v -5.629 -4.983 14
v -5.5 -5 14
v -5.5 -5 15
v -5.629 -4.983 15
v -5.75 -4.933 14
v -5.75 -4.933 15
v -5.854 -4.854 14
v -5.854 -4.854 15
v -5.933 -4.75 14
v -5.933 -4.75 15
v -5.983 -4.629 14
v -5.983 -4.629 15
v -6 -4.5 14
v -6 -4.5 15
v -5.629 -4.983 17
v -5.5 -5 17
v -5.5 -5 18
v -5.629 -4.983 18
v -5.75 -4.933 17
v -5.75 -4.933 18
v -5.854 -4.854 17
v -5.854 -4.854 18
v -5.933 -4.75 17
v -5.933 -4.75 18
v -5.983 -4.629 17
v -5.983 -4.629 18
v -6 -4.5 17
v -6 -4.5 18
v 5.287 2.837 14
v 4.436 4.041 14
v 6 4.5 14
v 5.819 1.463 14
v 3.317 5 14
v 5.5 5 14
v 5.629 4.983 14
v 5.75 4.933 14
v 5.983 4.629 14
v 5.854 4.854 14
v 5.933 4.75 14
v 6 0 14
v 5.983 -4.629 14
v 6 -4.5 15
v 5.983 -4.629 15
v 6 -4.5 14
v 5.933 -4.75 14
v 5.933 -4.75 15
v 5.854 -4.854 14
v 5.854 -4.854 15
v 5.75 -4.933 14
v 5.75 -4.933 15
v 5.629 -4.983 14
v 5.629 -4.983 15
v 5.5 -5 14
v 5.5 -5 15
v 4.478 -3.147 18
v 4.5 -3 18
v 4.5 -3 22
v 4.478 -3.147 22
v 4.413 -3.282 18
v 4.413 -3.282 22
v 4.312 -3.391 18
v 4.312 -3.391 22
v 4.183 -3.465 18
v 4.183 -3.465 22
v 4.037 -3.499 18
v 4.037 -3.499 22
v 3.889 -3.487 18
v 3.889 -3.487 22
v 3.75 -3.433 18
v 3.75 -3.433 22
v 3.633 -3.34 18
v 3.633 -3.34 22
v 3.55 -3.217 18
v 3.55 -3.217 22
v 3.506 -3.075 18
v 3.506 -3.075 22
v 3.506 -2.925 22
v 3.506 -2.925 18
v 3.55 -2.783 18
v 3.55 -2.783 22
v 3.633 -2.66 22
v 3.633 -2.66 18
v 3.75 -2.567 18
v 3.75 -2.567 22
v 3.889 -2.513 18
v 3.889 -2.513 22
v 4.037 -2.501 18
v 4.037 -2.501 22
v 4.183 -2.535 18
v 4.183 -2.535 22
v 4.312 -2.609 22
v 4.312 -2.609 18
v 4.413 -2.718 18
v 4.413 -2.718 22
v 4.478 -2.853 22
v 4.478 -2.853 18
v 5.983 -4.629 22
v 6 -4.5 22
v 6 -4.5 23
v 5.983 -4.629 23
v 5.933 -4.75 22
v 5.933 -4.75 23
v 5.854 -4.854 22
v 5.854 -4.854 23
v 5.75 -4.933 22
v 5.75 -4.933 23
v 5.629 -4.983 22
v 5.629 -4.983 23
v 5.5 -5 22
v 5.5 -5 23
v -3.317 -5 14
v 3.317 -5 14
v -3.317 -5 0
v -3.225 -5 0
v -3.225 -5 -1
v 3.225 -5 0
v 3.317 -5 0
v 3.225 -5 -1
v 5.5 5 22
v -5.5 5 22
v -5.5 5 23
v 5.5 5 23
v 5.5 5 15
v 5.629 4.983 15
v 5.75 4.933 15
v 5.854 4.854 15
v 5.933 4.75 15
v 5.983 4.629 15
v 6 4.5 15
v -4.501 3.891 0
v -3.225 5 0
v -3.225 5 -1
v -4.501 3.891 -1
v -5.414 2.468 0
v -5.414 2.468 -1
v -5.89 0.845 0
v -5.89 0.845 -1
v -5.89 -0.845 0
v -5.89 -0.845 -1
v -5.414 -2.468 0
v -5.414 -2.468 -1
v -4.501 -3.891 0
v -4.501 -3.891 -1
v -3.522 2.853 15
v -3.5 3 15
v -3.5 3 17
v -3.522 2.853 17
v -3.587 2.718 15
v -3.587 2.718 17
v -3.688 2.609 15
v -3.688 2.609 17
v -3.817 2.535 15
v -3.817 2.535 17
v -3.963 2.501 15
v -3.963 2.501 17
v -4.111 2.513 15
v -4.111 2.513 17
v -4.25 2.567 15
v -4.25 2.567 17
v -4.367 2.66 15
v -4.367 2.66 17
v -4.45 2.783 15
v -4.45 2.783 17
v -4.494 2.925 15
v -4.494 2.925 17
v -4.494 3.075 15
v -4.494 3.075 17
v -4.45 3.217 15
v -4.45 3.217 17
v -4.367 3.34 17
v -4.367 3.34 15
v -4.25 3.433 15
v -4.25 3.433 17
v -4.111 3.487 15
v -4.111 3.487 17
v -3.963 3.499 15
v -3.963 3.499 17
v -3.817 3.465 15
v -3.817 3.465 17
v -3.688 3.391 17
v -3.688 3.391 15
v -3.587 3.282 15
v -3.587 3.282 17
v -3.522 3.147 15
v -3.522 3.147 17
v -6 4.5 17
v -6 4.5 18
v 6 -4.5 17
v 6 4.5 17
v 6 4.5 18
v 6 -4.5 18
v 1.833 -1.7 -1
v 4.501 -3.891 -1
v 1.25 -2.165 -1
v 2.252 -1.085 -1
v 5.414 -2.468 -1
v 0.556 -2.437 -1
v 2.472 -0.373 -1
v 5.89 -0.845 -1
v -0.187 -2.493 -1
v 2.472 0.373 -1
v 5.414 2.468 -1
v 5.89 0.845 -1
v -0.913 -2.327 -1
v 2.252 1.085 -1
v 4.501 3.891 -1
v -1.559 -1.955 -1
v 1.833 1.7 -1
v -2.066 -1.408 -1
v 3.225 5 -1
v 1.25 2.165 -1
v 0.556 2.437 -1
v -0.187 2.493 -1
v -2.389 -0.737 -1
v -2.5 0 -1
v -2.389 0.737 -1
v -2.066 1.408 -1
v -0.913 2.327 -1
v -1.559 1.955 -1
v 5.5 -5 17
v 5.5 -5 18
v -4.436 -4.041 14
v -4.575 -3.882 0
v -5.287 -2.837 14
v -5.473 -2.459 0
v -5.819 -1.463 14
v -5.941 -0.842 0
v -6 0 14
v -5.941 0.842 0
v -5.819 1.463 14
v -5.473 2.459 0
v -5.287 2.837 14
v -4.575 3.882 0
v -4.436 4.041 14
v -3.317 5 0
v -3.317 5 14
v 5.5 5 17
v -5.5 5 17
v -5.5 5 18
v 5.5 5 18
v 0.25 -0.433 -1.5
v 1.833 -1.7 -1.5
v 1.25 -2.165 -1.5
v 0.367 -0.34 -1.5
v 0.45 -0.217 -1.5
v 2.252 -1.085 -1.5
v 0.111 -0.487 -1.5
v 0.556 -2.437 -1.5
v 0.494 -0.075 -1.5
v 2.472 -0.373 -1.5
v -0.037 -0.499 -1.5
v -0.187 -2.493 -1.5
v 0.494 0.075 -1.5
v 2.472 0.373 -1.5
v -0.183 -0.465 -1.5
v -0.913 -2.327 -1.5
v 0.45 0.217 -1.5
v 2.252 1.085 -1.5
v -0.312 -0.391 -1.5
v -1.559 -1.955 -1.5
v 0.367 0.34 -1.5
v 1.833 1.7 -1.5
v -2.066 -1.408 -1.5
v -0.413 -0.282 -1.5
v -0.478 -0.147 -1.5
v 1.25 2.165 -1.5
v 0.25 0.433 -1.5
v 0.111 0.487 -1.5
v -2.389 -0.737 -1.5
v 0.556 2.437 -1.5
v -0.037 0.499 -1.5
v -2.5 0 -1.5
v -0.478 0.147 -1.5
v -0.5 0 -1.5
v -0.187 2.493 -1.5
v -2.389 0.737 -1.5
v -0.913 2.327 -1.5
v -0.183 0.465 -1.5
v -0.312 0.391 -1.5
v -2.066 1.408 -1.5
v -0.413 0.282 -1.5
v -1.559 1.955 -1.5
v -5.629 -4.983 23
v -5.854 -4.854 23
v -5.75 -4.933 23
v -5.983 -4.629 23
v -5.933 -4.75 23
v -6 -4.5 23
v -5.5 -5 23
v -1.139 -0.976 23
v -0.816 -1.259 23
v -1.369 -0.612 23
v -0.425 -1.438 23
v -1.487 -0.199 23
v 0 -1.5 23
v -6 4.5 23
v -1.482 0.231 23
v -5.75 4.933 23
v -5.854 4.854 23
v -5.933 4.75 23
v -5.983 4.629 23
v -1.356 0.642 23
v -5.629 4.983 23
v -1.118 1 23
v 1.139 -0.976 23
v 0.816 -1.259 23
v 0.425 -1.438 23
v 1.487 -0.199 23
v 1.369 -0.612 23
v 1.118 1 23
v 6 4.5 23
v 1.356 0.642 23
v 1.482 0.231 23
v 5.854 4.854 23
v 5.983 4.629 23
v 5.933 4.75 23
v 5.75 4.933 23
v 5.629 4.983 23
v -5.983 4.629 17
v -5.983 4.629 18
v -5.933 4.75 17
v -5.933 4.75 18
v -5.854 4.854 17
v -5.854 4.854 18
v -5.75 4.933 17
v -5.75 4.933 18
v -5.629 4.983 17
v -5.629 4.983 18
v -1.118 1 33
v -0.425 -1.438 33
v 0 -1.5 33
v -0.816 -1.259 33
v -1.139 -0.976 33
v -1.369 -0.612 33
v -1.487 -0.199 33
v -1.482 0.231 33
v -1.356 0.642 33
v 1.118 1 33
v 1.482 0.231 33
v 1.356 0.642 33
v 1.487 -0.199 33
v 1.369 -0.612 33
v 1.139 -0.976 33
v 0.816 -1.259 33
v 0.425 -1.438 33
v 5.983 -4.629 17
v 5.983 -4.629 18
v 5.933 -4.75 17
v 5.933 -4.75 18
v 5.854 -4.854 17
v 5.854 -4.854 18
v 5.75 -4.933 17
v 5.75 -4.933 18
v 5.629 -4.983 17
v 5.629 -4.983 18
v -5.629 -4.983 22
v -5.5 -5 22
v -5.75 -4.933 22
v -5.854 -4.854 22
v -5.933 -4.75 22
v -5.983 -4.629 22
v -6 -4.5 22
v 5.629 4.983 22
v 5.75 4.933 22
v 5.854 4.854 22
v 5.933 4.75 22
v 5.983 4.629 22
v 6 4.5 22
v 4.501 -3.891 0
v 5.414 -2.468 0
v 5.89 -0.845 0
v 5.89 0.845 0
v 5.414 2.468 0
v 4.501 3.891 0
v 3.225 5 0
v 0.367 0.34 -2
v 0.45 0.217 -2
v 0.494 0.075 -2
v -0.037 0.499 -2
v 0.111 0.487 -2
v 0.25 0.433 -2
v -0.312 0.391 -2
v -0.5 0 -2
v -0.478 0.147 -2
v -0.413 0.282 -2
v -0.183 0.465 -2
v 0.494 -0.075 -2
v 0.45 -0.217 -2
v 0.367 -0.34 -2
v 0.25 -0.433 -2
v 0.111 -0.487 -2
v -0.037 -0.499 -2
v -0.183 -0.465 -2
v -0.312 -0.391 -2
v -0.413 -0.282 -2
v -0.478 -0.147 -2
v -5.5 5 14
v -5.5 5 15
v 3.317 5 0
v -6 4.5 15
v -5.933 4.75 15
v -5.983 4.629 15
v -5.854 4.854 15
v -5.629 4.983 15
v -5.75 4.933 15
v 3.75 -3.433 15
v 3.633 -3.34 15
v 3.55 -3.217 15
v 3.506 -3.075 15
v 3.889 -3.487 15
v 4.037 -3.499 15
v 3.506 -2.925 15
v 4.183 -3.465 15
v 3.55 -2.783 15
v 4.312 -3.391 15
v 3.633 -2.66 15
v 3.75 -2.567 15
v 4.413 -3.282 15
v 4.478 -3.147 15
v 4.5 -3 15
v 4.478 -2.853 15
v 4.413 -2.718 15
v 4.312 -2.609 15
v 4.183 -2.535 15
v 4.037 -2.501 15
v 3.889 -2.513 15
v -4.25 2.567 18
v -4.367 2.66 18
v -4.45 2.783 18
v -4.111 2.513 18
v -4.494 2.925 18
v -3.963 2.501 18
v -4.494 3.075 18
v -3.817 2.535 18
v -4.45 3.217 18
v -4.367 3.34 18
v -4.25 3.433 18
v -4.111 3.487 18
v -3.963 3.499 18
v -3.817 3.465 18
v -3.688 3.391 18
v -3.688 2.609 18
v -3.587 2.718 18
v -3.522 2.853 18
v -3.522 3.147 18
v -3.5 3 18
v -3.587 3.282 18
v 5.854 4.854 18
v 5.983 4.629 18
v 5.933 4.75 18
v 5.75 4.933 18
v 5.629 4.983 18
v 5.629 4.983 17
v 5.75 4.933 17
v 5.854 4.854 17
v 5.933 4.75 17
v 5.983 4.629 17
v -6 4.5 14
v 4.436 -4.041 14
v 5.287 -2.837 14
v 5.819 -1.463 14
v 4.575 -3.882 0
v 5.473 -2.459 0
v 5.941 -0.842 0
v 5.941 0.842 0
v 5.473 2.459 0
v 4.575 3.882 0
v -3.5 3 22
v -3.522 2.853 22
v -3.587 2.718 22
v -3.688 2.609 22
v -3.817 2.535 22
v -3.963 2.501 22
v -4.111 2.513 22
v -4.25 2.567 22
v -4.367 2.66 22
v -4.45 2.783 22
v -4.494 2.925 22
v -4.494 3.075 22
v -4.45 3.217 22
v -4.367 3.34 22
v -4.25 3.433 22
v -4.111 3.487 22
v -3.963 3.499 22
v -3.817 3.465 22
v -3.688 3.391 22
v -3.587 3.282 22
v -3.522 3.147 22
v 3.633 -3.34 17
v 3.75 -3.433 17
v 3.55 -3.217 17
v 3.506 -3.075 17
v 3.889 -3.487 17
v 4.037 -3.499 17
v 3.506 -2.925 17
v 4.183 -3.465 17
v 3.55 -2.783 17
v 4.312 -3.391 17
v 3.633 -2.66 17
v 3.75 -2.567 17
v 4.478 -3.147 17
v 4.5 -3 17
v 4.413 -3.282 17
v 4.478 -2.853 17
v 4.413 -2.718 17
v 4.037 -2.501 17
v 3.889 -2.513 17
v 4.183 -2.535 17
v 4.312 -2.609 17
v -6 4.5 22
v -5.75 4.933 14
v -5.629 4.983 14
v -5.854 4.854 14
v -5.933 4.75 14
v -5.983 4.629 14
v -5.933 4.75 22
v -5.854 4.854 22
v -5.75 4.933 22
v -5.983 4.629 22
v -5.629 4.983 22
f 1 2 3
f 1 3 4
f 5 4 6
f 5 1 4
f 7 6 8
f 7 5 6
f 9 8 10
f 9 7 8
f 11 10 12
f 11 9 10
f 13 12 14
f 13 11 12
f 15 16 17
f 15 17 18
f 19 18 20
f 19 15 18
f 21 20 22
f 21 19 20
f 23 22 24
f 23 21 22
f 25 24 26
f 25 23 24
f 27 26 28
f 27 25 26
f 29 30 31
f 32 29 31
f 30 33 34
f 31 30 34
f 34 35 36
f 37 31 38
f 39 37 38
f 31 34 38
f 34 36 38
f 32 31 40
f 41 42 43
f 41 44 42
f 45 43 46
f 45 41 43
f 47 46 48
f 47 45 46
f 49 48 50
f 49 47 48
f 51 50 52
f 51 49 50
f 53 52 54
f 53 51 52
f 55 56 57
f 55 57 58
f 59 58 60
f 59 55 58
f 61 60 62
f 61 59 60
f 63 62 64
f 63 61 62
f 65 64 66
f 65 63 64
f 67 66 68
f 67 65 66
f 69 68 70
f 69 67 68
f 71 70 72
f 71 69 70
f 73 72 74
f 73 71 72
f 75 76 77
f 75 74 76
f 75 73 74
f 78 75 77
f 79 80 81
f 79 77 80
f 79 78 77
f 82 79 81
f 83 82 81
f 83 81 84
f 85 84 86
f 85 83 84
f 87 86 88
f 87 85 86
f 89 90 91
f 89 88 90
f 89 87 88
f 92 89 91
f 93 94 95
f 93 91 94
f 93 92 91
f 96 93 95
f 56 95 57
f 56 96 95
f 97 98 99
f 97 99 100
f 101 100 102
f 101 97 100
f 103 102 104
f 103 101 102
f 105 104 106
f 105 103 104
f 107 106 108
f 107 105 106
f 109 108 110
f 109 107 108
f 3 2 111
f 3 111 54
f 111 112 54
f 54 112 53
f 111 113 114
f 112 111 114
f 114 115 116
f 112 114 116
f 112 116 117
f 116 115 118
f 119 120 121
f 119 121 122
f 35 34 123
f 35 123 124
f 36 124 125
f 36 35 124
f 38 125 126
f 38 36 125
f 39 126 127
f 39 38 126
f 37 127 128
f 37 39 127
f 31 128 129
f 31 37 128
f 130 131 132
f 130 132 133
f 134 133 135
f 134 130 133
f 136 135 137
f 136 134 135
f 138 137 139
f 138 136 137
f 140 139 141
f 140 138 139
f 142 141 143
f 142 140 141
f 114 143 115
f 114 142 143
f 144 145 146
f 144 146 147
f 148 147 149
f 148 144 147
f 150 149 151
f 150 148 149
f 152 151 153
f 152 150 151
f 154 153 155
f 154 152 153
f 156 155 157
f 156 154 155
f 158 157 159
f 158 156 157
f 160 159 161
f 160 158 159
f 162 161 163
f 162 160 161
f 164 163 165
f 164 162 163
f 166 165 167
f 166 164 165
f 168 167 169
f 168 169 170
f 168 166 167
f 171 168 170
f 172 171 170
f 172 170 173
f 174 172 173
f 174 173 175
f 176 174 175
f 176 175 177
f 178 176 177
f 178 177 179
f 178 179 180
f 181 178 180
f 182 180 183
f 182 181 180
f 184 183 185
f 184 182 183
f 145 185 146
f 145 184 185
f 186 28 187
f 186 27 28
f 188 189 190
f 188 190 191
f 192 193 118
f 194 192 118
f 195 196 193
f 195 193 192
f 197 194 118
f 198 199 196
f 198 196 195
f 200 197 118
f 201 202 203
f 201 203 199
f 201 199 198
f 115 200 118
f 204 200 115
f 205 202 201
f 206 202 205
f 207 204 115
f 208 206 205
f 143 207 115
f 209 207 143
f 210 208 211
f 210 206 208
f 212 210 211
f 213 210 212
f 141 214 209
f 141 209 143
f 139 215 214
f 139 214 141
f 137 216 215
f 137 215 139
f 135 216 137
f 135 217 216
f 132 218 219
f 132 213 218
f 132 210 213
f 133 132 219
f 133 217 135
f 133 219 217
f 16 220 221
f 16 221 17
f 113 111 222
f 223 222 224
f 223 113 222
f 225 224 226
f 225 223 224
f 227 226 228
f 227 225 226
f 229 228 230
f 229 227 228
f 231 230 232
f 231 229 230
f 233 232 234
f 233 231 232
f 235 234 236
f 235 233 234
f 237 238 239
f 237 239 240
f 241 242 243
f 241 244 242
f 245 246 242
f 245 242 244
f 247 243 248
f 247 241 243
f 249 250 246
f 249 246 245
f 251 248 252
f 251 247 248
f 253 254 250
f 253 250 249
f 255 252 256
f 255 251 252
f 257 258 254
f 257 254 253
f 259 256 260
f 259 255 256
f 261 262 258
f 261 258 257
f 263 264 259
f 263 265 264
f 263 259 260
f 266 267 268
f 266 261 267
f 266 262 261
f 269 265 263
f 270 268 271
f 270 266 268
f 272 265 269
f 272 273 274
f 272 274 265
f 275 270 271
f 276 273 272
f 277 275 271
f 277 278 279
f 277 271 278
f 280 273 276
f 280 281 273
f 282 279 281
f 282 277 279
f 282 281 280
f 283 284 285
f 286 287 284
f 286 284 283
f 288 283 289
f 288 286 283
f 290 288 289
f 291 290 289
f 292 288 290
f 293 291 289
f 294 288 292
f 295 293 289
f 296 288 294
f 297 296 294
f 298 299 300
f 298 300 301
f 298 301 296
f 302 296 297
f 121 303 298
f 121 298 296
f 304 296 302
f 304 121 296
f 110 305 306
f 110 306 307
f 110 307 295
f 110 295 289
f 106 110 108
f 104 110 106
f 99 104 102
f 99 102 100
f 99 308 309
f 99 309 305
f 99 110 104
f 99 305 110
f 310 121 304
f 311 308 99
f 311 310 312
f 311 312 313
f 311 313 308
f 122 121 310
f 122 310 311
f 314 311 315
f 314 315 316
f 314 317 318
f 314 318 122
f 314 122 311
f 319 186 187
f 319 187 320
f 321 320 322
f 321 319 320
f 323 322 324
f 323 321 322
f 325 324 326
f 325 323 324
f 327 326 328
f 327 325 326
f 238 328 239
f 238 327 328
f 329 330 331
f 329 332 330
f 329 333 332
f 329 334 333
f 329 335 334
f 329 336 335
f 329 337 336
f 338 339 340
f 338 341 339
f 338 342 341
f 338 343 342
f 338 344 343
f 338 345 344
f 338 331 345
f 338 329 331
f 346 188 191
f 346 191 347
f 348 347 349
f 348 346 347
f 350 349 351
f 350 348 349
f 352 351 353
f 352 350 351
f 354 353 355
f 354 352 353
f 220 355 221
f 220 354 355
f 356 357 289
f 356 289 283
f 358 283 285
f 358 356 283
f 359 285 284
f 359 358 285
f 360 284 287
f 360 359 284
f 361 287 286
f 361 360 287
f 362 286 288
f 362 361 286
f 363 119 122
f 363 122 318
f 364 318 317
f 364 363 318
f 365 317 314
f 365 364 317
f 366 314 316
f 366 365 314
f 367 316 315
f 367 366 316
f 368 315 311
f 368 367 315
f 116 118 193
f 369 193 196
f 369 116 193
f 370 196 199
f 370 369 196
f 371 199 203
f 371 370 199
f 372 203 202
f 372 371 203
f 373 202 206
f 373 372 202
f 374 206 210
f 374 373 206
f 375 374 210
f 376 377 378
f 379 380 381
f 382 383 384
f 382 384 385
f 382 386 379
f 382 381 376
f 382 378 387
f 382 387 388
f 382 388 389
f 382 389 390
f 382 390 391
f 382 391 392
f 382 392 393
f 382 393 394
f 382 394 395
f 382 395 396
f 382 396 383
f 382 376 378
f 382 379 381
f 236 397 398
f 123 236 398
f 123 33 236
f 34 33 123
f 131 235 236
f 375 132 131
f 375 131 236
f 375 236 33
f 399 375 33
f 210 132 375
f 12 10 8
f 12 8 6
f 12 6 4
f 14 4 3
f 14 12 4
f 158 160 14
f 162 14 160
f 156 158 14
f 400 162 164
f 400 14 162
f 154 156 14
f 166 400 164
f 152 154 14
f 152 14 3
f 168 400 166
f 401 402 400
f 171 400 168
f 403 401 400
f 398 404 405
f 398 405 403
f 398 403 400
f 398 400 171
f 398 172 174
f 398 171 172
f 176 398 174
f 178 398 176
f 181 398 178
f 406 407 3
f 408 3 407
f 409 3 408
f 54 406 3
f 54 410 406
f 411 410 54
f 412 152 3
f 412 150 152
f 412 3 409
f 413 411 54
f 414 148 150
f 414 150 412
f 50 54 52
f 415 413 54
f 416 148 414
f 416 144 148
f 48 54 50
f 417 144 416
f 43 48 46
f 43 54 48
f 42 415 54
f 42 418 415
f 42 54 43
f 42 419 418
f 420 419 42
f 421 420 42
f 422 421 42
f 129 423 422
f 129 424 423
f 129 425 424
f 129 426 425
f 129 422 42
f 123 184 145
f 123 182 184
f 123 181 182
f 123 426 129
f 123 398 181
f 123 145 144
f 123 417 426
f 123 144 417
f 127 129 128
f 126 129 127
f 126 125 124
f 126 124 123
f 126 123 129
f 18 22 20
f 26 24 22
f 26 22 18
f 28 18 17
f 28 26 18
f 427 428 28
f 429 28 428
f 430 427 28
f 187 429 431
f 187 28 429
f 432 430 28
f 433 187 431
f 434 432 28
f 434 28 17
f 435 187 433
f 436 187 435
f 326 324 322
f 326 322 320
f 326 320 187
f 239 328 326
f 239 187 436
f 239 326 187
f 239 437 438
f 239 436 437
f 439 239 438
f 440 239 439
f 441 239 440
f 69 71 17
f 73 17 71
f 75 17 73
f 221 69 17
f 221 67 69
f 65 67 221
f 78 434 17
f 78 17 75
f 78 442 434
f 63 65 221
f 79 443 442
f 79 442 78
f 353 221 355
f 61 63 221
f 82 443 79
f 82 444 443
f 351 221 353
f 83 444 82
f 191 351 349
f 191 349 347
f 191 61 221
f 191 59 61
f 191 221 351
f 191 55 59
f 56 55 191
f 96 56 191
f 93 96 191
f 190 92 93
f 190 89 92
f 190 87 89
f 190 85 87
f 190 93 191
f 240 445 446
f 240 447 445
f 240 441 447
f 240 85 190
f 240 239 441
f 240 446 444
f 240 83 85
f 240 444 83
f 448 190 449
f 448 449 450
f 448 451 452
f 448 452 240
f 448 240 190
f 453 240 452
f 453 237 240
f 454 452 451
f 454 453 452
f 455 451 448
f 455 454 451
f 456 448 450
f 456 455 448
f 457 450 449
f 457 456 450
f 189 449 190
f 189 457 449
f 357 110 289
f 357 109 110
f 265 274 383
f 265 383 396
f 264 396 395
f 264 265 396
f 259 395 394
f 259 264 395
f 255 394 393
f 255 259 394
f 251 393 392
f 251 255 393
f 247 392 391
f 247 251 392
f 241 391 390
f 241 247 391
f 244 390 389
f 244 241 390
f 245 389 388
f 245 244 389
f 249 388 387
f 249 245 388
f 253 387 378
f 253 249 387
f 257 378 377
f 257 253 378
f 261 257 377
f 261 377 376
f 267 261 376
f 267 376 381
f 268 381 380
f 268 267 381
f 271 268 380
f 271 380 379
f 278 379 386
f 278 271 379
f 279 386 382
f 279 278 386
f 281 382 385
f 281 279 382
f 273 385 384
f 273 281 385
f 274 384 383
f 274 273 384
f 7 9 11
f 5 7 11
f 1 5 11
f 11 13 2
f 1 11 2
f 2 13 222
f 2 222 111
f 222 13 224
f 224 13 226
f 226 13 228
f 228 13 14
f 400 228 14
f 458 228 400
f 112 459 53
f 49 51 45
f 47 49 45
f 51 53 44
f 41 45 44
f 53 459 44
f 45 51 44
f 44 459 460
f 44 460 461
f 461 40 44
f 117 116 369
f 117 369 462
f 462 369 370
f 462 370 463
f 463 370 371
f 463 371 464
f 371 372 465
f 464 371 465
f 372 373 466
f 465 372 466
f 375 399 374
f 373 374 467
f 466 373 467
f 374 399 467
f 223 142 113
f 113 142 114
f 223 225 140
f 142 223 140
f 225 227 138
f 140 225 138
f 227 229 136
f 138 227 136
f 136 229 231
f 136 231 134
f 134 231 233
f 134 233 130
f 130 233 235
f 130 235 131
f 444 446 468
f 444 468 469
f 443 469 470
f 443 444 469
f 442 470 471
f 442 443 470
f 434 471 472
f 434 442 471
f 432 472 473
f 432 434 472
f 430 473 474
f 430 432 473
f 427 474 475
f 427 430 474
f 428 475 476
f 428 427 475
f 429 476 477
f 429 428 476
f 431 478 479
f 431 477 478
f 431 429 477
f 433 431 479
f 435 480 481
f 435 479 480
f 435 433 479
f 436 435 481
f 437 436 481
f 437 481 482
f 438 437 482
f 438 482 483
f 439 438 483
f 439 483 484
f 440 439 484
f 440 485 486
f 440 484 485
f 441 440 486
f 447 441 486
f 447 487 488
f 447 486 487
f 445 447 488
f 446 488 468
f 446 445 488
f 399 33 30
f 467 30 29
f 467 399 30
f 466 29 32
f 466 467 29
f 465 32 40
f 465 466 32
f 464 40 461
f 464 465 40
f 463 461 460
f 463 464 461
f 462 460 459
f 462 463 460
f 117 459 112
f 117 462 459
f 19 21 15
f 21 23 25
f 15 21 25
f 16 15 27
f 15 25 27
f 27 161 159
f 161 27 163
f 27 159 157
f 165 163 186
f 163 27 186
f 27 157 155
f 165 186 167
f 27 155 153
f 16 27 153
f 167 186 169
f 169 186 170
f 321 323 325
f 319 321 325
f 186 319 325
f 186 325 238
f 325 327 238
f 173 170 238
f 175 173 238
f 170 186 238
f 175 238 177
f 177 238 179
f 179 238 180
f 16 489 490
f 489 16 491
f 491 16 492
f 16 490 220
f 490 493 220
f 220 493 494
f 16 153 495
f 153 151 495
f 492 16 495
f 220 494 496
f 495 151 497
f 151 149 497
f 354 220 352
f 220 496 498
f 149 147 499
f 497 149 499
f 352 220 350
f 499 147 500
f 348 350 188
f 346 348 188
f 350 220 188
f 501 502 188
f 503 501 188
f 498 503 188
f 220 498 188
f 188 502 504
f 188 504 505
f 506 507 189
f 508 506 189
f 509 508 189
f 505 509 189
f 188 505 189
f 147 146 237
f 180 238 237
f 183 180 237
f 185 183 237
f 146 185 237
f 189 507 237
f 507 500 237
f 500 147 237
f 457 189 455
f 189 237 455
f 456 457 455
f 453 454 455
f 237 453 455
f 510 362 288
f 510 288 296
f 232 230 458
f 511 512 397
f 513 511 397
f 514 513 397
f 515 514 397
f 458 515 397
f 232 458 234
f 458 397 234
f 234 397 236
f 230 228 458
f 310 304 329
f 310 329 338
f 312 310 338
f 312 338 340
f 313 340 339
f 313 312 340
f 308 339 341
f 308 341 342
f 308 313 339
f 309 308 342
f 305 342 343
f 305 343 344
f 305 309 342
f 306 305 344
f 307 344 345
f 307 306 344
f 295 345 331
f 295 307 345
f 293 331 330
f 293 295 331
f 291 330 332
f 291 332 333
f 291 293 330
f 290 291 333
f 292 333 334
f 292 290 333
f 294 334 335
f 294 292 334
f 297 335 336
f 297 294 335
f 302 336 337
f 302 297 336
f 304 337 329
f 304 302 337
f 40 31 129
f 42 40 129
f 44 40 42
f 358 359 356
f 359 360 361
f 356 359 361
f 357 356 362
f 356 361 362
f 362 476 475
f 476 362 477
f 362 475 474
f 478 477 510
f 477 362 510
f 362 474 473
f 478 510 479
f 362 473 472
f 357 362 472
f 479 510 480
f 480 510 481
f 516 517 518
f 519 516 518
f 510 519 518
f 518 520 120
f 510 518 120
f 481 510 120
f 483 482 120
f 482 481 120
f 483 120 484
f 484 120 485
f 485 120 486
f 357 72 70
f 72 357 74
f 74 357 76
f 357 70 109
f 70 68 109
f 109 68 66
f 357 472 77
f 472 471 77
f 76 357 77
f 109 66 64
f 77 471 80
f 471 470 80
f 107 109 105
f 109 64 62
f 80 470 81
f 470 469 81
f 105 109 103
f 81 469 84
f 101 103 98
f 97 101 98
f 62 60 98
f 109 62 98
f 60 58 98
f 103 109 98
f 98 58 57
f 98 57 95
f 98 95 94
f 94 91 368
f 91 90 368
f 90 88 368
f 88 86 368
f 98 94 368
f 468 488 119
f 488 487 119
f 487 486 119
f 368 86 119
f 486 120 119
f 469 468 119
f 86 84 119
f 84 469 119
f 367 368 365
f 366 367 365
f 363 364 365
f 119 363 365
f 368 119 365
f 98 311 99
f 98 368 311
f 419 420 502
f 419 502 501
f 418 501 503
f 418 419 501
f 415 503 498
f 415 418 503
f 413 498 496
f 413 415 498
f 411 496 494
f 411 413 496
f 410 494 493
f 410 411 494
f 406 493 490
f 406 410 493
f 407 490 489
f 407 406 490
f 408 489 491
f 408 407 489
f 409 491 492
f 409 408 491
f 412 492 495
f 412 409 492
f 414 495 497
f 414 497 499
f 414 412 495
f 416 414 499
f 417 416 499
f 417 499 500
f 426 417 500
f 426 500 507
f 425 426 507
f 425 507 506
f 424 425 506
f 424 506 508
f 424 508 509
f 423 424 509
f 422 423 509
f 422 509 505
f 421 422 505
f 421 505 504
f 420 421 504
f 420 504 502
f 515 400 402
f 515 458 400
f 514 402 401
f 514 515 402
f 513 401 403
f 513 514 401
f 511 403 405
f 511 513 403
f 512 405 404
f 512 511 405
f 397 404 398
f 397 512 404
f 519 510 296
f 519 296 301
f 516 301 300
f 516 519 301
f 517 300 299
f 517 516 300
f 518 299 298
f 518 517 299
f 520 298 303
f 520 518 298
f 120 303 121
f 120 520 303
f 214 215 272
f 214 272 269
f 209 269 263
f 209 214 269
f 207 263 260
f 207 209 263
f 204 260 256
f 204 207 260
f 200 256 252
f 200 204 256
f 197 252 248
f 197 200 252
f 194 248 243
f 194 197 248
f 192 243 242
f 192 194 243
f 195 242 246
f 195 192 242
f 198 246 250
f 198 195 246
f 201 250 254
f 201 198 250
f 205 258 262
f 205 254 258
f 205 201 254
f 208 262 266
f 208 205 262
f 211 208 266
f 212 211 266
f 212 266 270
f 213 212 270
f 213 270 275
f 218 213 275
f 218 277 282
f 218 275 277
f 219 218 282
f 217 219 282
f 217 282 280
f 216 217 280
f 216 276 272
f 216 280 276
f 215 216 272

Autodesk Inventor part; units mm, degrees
ref_plane "YZ Plane" through (0, 0, 0) normal (1, 0, 0) x (0, 1, 0)
ref_plane "XZ Plane" through (0, 0, 0) normal (0, 1, 0) x (-1, 0, 0)
ref_plane "XY Plane" through (0, 0, 0) normal (0, 0, 1) x (1, 0, 0)
sketch "Sketch1" plane through (0, 0, 0) normal (0, 0, 1) x (1, 0, 0)
  circle A0 centre (0, 0) radius 6
  line L0 (0, 0) -> (0, 5)
  line L1 (0, 5) -> (3.3166, 5)
  line L2 (0, 5) -> (-3.3166, 5)
  line L3 (0, 0) -> (0, -5)
  line L4 (0, -5) -> (3.3166, -5)
  line L5 (0, -5) -> (-3.3166, -5)
  dimension "d0" = 12
  dimension "d1" = 5
  dimension "d2" = 5
extrude "Extrusion1" add sketch "Sketch1" along normal blind 14 contours A0 L4 L3 L0 L1 | L2 L0 L3 L5 A0
sketch "Sketch2" plane through (0, 0, 14) normal (0, 0, 1) x (1, 0, 0)
  arc A0 (-3.3166, 5) -> (-3.3166, -5) centre (0, 0) ccw projected
  line L0 (-6, 0) -> (-6, 4.5)
  line L1 (-5.5, 5) -> (5.5, 5)
  line L2 (6, 4.5) -> (6, -4.5)
  line L3 (5.5, -5) -> (-5.5, -5)
  line L4 (-6, -4.5) -> (-6, 5)
  arc A1 (-5.5, 5) -> (-6, 4.5) centre (-5.5, 4.5) ccw
  arc A2 (-6, -4.5) -> (-5.5, -5) centre (-5.5, -4.5) ccw
  arc A3 (5.5, -5) -> (6, -4.5) centre (5.5, -4.5) ccw
  arc A4 (6, 4.5) -> (5.5, 5) centre (5.5, 4.5) ccw
  point P0 (6, -5)
  point P1 (-6, -5)
  dimension "d5" = 12
  dimension "d6" = 0.5
  dimension "d32" = 10
  dimension "d33" = 5
extrude "Extrusion2" add sketch "Sketch2" along normal blind 1
sketch "Sketch3" plane through (0, 0, 15) normal (0, 0, 1) x (1, 0, 0)
  line L0 (0, 0) -> (-4, 0)
  line L1 (-4, 0) -> (-4, 3)
  line L2 (0, 0) -> (0, -3)
  line L3 (0, -3) -> (4, -3)
  circle A0 centre (-4, 3) radius 0.5
  circle A1 centre (4, -3) radius 0.5
  dimension "d9" = 4
  dimension "d10" = 3
  dimension "d11" = 3
  dimension "d12" = 4
  dimension "d13" = 1
  dimension "d14" = 1
extrude "Extrusion3" add sketch "Sketch3" along normal blind 2
sketch "Sketch4" plane through (-4, 3, 17) normal (0, 0, 1) x (1, 0, 0)
  line L0 (-1.5, 2) -> (9.5, 2)
  line L1 (10, 1.5) -> (10, -7.5)
  line L2 (9.5, -8) -> (-1.5, -8)
  line L3 (-2, -7.5) -> (-2, 1.5)
  arc A0 (-1.5, 2) -> (-2, 1.5) centre (-1.5, 1.5) ccw
  arc A1 (-2, -7.5) -> (-1.5, -8) centre (-1.5, -7.5) ccw
  arc A2 (9.5, -8) -> (10, -7.5) centre (9.5, -7.5) ccw
  arc A3 (10, 1.5) -> (9.5, 2) centre (9.5, 1.5) ccw
  line L4 (-1.5, -8) -> (9.5, -8) projected
  line L5 (-2, 1.5) -> (-2, -7.5) projected
  point P0 (4, -3)
  dimension "d17" = 0.5
  dimension "d36" = 10
  dimension "d37" = 12
  dimension "d38" = 0
  dimension "d39" = 0
extrude "Extrusion4" add sketch "Sketch4" along normal blind 1
sketch "Sketch5" plane through (-4, 3, 18) normal (0, 0, 1) x (1, 0, 0)
  circle A0 centre (0, 0) radius 0.5 projected
  circle A1 centre (0, 0) radius 0.5
  circle A2 centre (8, -6) radius 0.5 projected
  circle A3 centre (8, -6) radius 0.5
  point P0 (4, -3)
  point P1 (7.9, -5.5101)
  point P2 (7.9, -6.4899)
extrude "Extrusion5" add sketch "Sketch5" along normal blind 4
sketch "Sketch6" plane through (-4, 3, 22) normal (0, 0, 1) x (1, 0, 0)
  line L0 (-1.5, 2) -> (9.5, 2)
  line L1 (10, 1.5) -> (10, -7.5)
  line L2 (9.5, -8) -> (-1.5, -8)
  line L3 (-2, -7.5) -> (-2, 1.5)
  arc A0 (-1.5, 2) -> (-2, 1.5) centre (-1.5, 1.5) ccw
  arc A1 (10, 1.5) -> (9.5, 2) centre (9.5, 1.5) ccw
  arc A2 (9.5, -8) -> (10, -7.5) centre (9.5, -7.5) ccw
  arc A3 (-2, -7.5) -> (-1.5, -8) centre (-1.5, -7.5) ccw
  line L4 (-1.5, -8) -> (9.5, -8) projected
  line L5 (-2, 1.5) -> (-2, -7.5) projected
  point P0 (4, -3)
  dimension "d22" = 0.5
  dimension "d40" = 10
  dimension "d41" = 12
  dimension "d42" = 0
  dimension "d43" = 0
extrude "Extrusion6" add sketch "Sketch6" along normal blind 1
sketch "Sketch7" plane through (-4, 3, 23) normal (0, 0, 1) x (1, 0, 0)
  circle A0 centre (4, -3) radius 1.5
  line L0 (4, -3) -> (4, -2)
  line L1 (4, -2) -> (5.118, -2)
  line L2 (4, -2) -> (2.882, -2)
  dimension "d25" = 3
  dimension "d26" = 1
extrude "Extrusion7" add sketch "Sketch7" along normal blind 10 contours A0 L2 L1 picked at (3.9981, -3.6594)
sketch "Sketch8" plane through (0, 0, 0) normal (0, 0, -1) x (-1, 0, 0)
  circle A0 centre (0, 0) radius 5.95
  line L0 (0, 0) -> (0, -5)
  line L1 (3.3166, -5) -> (-3.3166, -5) projected
  line L2 (0, -5) -> (3.3166, -5)
  line L3 (3.3166, -5) -> (-3.2253, -5)
  line L4 (0, 0) -> (0, 5)
  line L5 (-3.3166, 5) -> (3.3166, 5) projected
  line L6 (3.289, 4.9583) -> (-3.289, 4.9583)
  point P0 (-3.2253, -5)
  point P1 (3.2253, -5)
  point P2 (3.2253, 5)
  point P3 (-3.2253, 5)
  dimension "d35" = 11.9
  dimension "d34" = 5
extrude "Extrusion8" add sketch "Sketch8" along normal blind 1 contours A0 L1 L0 L4 L6 | L6 L4 L5 A0 | L6 A0 L5 L4 | L4 L0 L1 A0 L6
sketch "Sketch9" plane through (0, 0, -1) normal (0, 0, -1) x (-1, 0, 0)
  arc A0 (-1.118, 1) -> (1.118, 1) centre (0, 0) ccw projected
  circle A1 centre (0, 0) radius 2.5
  dimension "d44" = 5
extrude "Extrusion9" add sketch "Sketch9" along normal blind 0.5
sketch "Sketch10" plane through (0, 0, -1.5) normal (0, 0, -1) x (-1, 0, 0)
  circle A0 centre (0, 0) radius 0.5
  dimension "d47" = 1
extrude "Extrusion10" add sketch "Sketch10" along normal blind 0.5
properties part number "minimotor"
